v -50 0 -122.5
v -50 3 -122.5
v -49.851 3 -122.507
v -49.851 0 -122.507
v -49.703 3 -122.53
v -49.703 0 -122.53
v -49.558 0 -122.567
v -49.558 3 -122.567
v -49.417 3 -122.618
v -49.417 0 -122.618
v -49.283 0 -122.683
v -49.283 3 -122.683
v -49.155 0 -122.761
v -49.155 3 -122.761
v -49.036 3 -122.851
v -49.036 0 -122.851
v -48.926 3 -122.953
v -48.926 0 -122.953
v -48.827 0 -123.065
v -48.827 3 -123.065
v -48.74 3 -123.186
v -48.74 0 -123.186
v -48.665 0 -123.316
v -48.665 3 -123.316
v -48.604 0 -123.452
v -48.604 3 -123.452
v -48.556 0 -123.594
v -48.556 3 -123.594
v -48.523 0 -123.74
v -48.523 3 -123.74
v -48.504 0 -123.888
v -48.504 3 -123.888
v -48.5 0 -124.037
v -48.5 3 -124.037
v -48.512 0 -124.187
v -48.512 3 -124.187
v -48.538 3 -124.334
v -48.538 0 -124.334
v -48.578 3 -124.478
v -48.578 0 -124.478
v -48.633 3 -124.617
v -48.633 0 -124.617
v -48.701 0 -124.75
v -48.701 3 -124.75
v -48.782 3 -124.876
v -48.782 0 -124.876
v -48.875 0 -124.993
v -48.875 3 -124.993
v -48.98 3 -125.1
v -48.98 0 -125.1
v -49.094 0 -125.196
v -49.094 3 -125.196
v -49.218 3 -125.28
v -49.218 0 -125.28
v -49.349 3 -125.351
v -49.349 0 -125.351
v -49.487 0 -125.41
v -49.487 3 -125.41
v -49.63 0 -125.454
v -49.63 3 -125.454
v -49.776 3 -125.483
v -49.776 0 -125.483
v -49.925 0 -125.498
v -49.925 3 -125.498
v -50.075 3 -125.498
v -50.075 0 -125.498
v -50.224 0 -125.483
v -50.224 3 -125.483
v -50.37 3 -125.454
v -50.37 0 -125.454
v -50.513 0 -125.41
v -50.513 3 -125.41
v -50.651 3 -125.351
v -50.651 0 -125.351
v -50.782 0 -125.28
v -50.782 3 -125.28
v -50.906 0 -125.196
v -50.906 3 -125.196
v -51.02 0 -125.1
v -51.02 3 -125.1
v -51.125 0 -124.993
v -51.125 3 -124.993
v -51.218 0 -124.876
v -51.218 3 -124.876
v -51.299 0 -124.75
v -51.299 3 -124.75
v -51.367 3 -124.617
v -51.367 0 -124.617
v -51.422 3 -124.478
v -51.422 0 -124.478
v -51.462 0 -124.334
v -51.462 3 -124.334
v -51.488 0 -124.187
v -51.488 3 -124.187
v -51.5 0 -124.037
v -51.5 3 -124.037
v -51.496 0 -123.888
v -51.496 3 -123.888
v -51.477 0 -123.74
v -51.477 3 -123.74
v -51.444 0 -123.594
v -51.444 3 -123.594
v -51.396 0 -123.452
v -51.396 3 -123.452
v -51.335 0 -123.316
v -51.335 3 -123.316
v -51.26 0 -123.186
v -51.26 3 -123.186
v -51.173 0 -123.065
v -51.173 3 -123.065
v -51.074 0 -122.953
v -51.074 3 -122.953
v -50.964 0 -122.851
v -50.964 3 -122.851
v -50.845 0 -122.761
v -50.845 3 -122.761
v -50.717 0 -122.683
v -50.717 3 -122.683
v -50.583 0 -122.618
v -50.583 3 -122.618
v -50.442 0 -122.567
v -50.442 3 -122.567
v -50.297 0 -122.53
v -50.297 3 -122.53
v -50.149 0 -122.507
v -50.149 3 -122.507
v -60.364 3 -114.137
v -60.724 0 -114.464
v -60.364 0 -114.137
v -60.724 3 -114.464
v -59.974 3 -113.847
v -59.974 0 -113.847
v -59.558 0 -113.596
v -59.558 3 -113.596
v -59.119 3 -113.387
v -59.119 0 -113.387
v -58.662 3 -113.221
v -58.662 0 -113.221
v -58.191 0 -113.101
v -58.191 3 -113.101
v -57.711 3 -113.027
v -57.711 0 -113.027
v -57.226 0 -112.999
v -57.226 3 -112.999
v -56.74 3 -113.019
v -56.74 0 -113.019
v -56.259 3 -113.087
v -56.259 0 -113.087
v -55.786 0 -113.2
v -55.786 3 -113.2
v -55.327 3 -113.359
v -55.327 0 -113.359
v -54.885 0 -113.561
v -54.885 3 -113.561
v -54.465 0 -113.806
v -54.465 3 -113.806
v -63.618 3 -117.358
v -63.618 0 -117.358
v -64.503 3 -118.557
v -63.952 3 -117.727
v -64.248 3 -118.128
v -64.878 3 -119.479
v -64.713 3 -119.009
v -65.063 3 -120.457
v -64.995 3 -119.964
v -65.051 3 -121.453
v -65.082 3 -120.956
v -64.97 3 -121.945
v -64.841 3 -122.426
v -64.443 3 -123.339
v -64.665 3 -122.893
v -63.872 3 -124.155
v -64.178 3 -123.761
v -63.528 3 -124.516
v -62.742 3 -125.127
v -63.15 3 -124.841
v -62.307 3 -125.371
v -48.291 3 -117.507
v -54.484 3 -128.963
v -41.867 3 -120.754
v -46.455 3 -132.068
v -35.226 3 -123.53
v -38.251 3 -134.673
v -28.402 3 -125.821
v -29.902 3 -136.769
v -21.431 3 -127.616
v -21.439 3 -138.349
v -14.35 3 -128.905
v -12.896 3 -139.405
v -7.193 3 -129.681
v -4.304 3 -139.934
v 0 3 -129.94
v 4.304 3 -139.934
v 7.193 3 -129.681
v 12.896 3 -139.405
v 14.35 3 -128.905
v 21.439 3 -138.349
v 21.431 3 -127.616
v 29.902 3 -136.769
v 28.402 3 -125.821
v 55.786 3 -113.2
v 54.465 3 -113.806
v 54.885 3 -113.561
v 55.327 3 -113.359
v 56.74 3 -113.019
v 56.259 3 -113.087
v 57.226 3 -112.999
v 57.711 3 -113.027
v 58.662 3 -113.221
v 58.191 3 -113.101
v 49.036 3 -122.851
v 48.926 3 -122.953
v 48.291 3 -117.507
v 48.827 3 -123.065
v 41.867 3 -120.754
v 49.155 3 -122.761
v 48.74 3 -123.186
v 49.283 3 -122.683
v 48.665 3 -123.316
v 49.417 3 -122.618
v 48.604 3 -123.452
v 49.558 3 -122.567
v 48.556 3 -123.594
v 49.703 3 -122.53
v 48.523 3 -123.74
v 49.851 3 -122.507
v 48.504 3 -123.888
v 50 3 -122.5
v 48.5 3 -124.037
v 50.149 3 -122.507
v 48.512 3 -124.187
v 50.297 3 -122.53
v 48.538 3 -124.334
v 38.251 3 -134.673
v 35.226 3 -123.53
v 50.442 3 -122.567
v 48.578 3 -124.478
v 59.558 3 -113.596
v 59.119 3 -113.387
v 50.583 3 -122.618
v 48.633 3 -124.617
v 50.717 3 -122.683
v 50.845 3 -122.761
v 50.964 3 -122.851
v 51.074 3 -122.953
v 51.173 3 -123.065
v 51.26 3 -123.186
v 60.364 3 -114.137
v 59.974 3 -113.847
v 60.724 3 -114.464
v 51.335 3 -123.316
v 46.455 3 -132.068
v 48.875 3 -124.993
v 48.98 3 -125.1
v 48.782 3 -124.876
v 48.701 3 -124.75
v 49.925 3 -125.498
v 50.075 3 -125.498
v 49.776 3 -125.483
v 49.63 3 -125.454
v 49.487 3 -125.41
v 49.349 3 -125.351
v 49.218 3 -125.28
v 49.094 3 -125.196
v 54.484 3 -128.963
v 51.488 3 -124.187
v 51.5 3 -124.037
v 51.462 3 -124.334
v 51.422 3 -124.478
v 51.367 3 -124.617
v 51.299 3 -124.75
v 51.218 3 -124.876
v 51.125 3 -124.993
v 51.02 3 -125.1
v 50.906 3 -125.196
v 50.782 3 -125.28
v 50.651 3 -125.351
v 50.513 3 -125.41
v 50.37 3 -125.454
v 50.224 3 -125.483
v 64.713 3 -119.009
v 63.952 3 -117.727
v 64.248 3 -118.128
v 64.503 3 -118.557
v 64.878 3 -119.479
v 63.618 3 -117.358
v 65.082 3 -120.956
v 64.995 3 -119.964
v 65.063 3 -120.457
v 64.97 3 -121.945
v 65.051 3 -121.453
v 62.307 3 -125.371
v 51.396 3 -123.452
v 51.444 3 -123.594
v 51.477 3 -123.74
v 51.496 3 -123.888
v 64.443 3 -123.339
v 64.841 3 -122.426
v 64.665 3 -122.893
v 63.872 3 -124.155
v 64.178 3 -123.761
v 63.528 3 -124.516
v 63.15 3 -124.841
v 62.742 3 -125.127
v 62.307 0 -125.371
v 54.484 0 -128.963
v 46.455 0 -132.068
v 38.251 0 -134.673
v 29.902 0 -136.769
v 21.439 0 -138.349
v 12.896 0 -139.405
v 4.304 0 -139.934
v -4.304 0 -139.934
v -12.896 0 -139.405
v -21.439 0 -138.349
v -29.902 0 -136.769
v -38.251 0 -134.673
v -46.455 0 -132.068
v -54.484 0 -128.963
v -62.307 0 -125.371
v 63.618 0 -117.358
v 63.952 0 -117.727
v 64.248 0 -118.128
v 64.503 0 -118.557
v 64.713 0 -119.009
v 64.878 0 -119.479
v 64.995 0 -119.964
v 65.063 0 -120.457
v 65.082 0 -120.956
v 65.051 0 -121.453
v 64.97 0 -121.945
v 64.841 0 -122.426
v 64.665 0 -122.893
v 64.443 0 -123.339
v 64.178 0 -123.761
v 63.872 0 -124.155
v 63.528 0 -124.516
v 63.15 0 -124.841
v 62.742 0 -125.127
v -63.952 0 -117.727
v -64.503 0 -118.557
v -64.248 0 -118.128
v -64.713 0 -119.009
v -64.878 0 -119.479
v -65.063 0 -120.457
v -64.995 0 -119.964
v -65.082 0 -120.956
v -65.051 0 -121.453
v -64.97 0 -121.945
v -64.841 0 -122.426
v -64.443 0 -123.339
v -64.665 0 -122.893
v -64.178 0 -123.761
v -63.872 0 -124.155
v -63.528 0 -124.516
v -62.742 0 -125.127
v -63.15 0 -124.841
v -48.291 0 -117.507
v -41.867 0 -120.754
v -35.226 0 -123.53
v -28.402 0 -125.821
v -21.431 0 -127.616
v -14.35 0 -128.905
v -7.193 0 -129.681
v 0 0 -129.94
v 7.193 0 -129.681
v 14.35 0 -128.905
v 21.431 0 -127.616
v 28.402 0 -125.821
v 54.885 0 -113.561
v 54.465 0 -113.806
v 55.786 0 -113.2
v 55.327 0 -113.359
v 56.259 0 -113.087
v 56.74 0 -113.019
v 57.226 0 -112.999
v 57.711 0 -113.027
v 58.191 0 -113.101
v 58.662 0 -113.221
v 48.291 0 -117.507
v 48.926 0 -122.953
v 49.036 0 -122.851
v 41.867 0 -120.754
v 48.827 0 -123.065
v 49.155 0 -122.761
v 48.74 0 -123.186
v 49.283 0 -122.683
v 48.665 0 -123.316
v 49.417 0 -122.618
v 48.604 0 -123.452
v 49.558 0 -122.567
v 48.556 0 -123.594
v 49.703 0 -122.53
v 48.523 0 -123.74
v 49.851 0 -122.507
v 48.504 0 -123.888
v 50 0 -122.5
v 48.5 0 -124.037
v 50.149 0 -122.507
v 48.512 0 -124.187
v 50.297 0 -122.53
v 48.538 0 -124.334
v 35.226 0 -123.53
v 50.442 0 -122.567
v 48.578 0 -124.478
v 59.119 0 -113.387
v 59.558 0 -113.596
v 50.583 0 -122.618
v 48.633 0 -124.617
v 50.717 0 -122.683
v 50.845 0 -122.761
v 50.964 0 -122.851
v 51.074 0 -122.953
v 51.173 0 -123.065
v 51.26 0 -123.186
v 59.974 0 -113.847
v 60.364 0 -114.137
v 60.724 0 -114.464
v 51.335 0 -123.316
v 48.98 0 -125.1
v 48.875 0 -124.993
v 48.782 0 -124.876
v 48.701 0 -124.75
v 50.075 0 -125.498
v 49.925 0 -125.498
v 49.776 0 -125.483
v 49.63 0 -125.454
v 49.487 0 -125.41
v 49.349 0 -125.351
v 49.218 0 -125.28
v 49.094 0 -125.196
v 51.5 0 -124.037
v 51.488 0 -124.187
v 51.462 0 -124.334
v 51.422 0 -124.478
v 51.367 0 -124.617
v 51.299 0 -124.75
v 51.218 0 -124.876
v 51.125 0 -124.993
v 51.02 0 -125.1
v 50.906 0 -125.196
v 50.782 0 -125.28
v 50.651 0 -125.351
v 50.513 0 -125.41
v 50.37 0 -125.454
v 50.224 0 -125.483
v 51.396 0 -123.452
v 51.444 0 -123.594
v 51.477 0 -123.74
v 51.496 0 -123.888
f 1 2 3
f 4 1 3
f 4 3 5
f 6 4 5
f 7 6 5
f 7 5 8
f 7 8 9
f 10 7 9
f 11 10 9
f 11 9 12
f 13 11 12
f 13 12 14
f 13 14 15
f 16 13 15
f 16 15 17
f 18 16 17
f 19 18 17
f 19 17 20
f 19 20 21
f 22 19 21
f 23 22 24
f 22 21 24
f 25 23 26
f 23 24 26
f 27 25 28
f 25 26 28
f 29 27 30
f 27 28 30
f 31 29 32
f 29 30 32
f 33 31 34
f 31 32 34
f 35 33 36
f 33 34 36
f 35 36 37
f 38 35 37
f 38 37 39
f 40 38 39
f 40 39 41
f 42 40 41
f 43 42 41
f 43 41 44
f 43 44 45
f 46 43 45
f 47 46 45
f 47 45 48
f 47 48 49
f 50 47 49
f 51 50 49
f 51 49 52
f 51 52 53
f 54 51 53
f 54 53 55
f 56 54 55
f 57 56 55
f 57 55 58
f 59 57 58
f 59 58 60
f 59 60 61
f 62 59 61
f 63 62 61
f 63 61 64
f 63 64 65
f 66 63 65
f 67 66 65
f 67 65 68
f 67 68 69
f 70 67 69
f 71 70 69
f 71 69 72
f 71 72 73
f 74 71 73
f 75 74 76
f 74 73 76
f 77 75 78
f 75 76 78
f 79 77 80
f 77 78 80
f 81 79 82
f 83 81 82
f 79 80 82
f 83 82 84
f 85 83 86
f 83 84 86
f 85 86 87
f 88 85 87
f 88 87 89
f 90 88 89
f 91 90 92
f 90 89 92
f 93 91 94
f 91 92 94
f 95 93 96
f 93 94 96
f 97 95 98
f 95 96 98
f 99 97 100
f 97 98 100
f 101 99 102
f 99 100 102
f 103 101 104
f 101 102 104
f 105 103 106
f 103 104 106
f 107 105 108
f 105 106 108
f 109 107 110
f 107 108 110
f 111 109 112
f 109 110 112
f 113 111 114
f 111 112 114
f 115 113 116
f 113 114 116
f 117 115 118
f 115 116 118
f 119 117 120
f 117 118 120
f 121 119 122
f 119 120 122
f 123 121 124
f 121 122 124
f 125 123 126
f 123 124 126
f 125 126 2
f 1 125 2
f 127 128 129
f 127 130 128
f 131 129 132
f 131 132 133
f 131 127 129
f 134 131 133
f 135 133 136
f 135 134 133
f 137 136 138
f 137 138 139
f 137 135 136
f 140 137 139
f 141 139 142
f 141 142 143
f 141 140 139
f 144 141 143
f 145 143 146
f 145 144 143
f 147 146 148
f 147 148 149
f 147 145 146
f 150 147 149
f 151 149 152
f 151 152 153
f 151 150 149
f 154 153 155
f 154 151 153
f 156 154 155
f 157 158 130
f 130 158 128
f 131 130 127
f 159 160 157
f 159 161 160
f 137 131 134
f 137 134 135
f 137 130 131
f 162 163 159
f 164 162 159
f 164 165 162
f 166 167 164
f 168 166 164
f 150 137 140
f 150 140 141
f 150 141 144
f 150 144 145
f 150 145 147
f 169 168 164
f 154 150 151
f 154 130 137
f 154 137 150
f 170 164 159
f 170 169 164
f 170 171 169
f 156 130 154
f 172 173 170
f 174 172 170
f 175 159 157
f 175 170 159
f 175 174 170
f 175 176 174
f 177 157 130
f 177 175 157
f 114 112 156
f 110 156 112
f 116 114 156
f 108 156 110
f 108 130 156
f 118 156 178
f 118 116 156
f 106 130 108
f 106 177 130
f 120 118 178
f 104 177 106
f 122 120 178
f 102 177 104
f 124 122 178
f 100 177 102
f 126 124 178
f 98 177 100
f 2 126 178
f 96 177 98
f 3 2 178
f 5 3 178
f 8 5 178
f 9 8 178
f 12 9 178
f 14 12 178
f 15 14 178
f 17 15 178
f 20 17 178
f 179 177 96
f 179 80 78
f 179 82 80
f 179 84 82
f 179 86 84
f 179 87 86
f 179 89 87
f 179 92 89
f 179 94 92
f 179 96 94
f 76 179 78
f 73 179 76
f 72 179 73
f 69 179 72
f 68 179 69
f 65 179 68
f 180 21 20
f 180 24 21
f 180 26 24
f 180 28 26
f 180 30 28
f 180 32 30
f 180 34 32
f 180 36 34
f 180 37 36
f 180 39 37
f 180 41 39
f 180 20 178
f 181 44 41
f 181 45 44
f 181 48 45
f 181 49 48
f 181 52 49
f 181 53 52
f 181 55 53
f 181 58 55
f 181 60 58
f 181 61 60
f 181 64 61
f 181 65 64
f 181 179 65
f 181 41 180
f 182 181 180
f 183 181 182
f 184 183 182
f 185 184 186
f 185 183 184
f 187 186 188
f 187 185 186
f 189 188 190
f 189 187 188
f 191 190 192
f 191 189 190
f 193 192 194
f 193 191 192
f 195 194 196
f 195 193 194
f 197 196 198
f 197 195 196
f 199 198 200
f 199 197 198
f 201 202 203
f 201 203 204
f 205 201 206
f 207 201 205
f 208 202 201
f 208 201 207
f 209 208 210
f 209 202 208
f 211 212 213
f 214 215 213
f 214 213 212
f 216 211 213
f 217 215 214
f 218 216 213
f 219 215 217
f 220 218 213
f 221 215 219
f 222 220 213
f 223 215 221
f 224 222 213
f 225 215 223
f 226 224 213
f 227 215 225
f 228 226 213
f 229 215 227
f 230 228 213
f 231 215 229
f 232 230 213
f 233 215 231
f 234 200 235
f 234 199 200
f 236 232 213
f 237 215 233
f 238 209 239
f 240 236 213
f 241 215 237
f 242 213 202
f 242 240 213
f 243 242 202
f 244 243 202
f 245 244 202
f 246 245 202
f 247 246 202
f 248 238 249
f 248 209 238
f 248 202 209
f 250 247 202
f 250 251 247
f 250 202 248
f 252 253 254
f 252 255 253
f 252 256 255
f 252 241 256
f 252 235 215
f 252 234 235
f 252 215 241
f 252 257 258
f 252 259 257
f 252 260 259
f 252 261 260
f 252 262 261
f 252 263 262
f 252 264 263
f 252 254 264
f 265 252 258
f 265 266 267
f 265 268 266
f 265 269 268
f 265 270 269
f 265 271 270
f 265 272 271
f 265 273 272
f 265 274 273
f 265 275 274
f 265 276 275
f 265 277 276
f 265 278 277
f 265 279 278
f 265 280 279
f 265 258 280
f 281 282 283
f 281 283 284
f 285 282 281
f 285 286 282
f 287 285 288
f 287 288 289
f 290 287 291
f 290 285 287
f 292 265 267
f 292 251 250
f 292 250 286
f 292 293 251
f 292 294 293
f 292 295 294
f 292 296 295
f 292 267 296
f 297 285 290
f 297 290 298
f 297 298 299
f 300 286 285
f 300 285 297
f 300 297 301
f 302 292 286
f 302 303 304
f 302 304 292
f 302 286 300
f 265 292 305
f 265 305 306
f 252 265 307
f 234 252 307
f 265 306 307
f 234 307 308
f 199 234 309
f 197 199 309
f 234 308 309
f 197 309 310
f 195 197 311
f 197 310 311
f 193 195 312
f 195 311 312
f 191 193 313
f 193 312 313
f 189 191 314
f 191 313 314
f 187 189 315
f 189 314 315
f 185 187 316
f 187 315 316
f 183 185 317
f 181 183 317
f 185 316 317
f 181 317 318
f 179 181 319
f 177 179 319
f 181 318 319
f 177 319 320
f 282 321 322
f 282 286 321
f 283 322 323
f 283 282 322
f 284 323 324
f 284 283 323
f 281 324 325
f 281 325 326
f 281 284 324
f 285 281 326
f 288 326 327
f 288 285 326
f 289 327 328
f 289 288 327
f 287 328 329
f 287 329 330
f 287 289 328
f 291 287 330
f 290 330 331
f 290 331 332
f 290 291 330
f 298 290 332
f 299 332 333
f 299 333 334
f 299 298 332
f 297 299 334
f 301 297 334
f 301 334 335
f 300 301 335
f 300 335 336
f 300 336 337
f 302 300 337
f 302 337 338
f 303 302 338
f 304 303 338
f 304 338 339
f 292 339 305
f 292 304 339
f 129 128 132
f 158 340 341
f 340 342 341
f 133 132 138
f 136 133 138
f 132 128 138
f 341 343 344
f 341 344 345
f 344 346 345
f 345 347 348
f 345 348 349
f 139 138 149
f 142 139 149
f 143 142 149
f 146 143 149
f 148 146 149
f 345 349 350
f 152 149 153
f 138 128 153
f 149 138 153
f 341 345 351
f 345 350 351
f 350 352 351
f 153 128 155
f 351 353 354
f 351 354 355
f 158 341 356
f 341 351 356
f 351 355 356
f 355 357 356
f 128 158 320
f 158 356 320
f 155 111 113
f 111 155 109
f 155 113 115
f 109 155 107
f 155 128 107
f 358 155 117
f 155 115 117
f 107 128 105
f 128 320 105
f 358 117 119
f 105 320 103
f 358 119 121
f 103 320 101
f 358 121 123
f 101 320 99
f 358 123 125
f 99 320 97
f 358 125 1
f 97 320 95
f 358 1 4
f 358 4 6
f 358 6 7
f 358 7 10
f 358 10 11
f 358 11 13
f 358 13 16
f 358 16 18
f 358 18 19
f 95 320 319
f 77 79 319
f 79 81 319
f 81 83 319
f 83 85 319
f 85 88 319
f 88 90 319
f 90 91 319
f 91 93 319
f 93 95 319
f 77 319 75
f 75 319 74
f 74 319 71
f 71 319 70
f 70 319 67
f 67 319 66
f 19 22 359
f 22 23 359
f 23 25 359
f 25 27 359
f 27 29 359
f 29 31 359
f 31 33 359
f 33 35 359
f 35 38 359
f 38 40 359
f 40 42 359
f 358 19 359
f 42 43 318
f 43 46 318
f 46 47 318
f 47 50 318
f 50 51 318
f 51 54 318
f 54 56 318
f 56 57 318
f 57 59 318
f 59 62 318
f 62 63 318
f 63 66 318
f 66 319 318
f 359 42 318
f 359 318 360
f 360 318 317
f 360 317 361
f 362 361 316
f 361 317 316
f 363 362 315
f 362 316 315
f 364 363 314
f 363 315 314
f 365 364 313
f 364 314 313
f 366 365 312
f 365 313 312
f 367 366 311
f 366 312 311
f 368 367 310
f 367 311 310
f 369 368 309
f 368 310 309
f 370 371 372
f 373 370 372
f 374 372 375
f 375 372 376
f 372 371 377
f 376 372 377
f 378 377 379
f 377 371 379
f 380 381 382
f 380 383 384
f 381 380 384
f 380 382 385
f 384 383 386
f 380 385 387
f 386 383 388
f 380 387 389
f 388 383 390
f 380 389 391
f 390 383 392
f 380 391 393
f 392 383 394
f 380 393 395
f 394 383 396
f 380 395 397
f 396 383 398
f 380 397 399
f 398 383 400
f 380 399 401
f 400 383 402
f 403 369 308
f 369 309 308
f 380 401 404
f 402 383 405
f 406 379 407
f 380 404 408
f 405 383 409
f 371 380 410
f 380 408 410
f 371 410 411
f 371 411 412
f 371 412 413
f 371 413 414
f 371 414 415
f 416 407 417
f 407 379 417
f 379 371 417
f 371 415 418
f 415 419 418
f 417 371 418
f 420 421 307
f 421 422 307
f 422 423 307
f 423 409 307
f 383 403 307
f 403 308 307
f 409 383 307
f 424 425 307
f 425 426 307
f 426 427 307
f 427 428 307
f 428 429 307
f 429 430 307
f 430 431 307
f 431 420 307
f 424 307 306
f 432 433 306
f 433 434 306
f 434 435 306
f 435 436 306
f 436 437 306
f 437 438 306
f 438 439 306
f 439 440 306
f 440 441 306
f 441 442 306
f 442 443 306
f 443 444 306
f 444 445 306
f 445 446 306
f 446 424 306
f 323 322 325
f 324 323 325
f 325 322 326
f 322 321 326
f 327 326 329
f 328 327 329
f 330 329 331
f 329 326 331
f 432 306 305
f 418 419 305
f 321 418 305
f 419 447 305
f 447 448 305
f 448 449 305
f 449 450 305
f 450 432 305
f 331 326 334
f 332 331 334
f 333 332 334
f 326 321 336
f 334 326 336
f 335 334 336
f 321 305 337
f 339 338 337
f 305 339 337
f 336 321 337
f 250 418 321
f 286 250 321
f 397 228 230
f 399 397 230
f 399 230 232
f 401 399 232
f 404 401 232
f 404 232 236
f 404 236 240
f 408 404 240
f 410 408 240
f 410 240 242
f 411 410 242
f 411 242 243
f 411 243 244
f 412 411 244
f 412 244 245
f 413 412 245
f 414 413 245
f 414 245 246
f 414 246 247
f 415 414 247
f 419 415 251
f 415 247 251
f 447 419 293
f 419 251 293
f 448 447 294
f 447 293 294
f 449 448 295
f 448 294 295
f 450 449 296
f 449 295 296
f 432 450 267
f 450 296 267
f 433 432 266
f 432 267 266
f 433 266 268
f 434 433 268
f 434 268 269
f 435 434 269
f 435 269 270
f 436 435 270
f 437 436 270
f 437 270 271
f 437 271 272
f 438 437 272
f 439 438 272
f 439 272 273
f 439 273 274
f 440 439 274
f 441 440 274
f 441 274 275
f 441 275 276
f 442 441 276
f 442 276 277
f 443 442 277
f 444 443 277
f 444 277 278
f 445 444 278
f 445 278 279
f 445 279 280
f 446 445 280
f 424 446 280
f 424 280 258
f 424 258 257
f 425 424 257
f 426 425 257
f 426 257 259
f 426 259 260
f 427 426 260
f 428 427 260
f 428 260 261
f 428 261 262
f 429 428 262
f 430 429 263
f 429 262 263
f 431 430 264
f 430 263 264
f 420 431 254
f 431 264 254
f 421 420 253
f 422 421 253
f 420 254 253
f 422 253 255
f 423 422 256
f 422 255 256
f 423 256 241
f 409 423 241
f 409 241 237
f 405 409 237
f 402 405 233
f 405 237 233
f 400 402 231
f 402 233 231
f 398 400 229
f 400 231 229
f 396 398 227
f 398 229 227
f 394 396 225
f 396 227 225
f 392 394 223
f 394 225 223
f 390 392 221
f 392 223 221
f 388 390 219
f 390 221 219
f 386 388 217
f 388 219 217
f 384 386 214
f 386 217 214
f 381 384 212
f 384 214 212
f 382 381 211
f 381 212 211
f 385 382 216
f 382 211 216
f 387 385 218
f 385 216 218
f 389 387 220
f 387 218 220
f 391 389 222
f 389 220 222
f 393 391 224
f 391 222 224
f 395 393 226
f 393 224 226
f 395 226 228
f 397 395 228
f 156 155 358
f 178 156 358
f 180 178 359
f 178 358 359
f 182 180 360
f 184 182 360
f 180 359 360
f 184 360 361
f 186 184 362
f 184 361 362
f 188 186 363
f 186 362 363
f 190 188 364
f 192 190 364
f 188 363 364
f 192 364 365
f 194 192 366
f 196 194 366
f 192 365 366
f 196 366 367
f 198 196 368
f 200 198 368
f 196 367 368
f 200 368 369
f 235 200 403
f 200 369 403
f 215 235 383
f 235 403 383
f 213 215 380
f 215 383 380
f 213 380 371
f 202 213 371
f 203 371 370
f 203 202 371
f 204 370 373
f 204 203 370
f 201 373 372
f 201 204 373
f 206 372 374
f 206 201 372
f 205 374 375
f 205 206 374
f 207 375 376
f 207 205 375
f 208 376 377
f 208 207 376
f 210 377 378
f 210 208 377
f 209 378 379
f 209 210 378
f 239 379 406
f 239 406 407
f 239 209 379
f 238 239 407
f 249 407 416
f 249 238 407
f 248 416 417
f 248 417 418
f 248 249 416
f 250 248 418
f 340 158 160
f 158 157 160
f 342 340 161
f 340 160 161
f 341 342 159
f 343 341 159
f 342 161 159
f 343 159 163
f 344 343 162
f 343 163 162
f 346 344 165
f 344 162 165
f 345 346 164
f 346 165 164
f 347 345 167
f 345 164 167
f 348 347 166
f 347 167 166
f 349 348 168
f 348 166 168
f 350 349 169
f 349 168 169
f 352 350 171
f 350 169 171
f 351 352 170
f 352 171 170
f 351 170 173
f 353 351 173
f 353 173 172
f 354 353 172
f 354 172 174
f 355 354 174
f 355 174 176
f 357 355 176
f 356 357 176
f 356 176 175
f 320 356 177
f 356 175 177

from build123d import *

# Parameters (mm, degrees)
BOSS_EXTRUDE1_DEPTH = 3
FILLET1_R           = 5
CUT_EXTRUDE1_REACH  = 156.417
SKETCH2_R           = 1.5


with BuildPart() as part:
    # Sketch1 → Boss-Extrude1 (new body)
    with BuildSketch(Plane(origin=(0, 0, 0), x_dir=(1, 0, 0), z_dir=(0, 1, 0))):
        with BuildLine():
            Line((-68.408481347, 122.148596717), (-57.801879629, 111.541994999))
            ThreePointArc((-57.801879629, 111.541994999), (0, 129.939649987), (57.801879629, 111.541994999))
            Line((57.801879629, 111.541994999), (68.408481347, 122.148596717))
            ThreePointArc((68.408481347, 122.148596717), (0, 140), (-68.408481347, 122.148596717))
        make_face()
    extrude(amount=BOSS_EXTRUDE1_DEPTH)

    # Fillet1
    fillet1_edges = [part.edges().sort_by_distance(p)[0] for p in [
        (68.408481347, 1.5, -122.148596717),
        (57.801879629, 1.5, -111.541994999),
        (-57.801879629, 1.5, -111.541994999),
        (-68.408481347, 1.5, -122.148596717),
    ]]
    fillet(fillet1_edges, radius=FILLET1_R)

    # Sketch2 → Cut-Extrude1 (cut, up to next)
    with BuildSketch(Plane(origin=(0, 3, 0), x_dir=(1, 0, 0), z_dir=(0, 1, 0)), mode=Mode.PRIVATE) as cut_extrude1_sk1:
        with Locations(Location((-50, 124, 0), (0, 0, 270))):
            Circle(SKETCH2_R)
    cut_extrude1_tool1 = extrude(cut_extrude1_sk1.sketch, amount=-CUT_EXTRUDE1_REACH, mode=Mode.PRIVATE) & part.part
    # Sketch2 → Cut-Extrude1 (cut, up to next)
    with BuildSketch(Plane(origin=(0, 3, 0), x_dir=(1, 0, 0), z_dir=(0, 1, 0)), mode=Mode.PRIVATE) as cut_extrude1_sk2:
        with Locations(Location((50, 124, 0), (0, 0, 270))):
            Circle(SKETCH2_R)
    cut_extrude1_tool2 = extrude(cut_extrude1_sk2.sketch, amount=-CUT_EXTRUDE1_REACH, mode=Mode.PRIVATE) & part.part
    add(cut_extrude1_tool1.solids().sort_by_distance((-50, 3, -124))[0], mode=Mode.SUBTRACT)
    add(cut_extrude1_tool2.solids().sort_by_distance((50, 3, -124))[0], mode=Mode.SUBTRACT)


solid = part.part
